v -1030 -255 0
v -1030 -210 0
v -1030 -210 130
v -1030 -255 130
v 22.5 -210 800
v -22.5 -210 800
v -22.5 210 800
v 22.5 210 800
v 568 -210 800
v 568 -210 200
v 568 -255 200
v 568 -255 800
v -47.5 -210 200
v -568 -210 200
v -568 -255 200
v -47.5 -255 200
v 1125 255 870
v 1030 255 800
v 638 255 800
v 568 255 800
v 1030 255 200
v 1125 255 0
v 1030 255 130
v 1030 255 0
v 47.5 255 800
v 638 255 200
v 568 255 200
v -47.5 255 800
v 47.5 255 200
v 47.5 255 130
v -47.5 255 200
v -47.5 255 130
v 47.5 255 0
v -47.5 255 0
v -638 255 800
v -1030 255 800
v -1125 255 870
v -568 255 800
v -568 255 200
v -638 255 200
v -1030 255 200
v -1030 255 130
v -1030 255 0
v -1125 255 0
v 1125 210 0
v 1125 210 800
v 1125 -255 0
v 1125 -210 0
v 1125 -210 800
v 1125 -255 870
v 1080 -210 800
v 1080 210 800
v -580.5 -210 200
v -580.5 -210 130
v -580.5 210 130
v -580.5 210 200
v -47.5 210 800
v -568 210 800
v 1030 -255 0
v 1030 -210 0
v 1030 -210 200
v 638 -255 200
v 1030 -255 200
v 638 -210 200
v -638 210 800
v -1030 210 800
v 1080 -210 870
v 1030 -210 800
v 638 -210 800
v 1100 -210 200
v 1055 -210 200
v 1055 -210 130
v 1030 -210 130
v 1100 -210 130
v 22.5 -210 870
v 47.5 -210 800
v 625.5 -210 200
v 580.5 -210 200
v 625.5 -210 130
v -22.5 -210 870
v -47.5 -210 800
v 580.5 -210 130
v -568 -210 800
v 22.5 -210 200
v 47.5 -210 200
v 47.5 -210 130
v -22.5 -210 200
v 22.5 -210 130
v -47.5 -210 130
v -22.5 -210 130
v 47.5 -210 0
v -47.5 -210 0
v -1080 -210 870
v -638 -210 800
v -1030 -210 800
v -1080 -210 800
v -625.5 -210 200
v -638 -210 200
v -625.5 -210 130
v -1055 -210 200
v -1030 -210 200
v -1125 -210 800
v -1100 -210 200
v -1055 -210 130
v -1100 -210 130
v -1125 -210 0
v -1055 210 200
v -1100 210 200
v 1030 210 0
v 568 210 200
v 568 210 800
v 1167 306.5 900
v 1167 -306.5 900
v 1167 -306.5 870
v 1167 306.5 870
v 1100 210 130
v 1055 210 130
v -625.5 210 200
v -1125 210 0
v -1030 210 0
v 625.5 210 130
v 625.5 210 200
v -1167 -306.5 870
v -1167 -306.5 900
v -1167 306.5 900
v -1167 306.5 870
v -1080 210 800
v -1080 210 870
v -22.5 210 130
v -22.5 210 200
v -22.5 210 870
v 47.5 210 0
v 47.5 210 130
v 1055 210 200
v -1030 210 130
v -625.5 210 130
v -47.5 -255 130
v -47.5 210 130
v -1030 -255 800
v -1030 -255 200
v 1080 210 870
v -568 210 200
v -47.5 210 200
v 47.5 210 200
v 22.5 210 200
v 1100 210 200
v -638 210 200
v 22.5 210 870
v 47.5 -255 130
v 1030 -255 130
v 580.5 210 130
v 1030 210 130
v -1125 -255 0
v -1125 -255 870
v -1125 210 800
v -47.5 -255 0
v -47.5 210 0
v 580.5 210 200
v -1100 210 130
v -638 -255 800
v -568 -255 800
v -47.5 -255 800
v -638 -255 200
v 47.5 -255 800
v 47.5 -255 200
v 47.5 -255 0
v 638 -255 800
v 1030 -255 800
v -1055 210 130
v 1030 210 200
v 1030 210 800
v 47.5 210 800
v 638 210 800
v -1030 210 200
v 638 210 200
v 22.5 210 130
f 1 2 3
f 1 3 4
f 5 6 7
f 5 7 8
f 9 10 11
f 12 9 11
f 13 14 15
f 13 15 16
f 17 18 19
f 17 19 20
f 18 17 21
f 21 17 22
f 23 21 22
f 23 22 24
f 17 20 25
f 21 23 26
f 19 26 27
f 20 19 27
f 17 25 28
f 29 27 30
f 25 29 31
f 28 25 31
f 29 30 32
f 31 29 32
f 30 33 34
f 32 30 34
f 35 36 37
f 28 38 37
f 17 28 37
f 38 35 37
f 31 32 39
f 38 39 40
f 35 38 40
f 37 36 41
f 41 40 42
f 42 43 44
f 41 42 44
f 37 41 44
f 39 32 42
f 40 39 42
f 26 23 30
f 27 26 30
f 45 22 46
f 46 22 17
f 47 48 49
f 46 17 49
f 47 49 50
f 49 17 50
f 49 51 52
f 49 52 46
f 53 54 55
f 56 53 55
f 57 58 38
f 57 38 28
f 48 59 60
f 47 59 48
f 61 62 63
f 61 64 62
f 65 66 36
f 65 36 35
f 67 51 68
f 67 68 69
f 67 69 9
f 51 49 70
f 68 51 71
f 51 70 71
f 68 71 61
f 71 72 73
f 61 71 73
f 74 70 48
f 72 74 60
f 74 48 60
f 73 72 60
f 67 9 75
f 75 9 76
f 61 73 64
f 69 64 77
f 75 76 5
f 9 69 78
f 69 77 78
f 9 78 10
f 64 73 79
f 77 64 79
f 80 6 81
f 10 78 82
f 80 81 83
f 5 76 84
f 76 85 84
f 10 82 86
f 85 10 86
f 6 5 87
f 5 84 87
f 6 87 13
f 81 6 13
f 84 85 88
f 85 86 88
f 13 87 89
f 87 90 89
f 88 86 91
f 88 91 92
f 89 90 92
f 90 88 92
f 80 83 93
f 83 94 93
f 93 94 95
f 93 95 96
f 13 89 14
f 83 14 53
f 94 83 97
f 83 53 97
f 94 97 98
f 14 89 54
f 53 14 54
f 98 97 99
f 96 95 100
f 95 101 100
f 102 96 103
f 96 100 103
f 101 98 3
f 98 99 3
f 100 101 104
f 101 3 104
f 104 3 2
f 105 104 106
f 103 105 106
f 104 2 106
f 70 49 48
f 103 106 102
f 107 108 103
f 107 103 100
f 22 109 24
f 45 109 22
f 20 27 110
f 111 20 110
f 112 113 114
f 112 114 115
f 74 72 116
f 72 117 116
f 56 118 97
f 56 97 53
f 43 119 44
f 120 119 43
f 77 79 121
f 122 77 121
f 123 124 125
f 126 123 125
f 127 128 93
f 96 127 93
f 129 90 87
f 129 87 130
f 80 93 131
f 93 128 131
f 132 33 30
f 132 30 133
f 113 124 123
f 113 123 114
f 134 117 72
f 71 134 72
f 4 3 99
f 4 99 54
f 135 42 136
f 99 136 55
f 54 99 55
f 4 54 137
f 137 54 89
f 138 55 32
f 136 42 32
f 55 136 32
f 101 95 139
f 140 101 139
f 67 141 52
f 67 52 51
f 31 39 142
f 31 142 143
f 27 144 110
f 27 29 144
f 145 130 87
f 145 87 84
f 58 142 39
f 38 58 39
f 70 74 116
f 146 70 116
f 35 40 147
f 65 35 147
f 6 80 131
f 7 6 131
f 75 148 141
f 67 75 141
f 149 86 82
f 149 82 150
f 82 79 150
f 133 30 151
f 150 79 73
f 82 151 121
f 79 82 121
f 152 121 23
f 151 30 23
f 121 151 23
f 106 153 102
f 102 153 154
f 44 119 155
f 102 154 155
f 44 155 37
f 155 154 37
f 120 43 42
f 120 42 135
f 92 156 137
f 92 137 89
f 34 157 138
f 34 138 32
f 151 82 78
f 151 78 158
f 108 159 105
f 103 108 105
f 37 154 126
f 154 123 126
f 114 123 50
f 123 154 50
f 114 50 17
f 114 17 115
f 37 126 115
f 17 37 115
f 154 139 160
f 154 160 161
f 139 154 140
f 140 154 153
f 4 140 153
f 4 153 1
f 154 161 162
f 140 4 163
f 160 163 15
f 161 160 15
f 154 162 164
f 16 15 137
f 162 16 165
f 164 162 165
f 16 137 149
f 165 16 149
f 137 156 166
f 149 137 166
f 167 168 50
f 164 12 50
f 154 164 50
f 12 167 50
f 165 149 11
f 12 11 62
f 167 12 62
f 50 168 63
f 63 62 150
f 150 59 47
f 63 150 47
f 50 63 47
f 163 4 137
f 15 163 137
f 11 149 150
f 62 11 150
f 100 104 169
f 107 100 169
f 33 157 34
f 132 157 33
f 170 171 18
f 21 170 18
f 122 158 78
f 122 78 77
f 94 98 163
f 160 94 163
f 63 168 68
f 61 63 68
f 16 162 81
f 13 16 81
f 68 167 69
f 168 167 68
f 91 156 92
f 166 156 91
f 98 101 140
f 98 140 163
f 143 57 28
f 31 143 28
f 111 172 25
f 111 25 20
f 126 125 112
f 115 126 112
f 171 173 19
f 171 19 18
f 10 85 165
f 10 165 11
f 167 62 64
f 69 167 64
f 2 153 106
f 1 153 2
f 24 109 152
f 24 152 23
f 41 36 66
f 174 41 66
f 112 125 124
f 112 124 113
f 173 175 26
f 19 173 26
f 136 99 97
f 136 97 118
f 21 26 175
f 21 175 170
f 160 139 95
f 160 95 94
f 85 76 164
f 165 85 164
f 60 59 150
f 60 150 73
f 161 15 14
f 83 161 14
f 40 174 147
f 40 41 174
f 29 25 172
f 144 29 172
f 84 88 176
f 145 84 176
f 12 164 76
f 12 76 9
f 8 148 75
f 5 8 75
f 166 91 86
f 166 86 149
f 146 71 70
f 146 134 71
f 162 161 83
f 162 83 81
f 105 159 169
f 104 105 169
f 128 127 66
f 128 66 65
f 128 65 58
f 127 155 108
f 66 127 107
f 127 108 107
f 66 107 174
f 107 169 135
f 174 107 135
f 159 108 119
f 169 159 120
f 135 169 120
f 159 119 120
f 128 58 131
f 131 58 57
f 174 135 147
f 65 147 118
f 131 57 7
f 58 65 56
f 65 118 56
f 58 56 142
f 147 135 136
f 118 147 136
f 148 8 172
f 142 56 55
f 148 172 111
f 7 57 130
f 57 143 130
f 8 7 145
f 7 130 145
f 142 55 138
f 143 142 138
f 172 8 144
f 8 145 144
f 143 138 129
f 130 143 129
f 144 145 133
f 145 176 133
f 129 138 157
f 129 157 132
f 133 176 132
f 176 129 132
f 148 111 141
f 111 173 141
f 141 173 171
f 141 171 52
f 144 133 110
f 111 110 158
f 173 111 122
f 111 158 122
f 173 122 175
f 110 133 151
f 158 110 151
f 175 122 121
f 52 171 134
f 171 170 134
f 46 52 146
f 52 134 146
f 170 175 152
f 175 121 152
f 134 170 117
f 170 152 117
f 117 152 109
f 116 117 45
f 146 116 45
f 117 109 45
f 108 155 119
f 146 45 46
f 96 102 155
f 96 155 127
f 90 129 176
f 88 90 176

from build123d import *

# Parameters (mm, degrees)
F1_W      = 2334
F1_H      = 613
F2_DEPTH  = 30
F3_W      = 45
F3_H      = 420
F3_W_2    = 982.5
F3_H_2    = 45
F4_DEPTH  = 70
F5_DEPTH  = 870
F8_W      = 45
F8_H      = 420
F9_DEPTH  = 70
F10_DEPTH = 670
F11_DEPTH = 70


# Not quite as in the source:
# - a feature names something its author has since deleted; it is built from what else it names


with BuildPart() as f2:
    # F1 (on offset) → F2 (new body)
    with BuildSketch(Plane.XY.offset(900)):
        Rectangle(F1_W, F1_H)
    extrude(amount=-F2_DEPTH)

    # F3 (on face) → F4 (join)
    with BuildSketch(Plane(origin=(0, 0, 870), x_dir=(1, 0, 0), z_dir=(0, 0, -1))):
        with Locations((-1102.5, 0)):
            Rectangle(F3_W, F3_H)
        with Locations((1102.5, 0)):
            Rectangle(F3_W, F3_H)
        with Locations((-538.75, 232.5)):
            Rectangle(F3_W_2, F3_H_2)
        with Locations((-538.75, -232.5)):
            Rectangle(F3_W_2, F3_H_2)
        Polygon((47.5, 255), (-47.5, 255), (-47.5, 210), (-22.5, 210), (22.5, 210), (47.5, 210), align=None)
        with Locations((538.75, 232.5)):
            Rectangle(F3_W_2, F3_H_2)
        Polygon((22.5, 210), (-22.5, 210), (-22.5, -210), (22.5, -210), (22.5, -47.5), (22.5, 47.5), align=None)
        with Locations((538.75, -232.5)):
            Rectangle(F3_W_2, F3_H_2)
    extrude(amount=F4_DEPTH)

    # F3 (on face) → F5 (join)
    with BuildSketch(Plane(origin=(0, 0, 870), x_dir=(1, 0, 0), z_dir=(0, 0, -1))):
        Polygon((-1030, 255), (-1125, 255), (-1125, 210), (-1080, 210), (-1030, 210), align=None)
        Polygon((47.5, 255), (-47.5, 255), (-47.5, 210), (-22.5, 210), (22.5, 210), (47.5, 210), align=None)
        Polygon((-1080, -210), (-1125, -210), (-1125, -255), (-1030, -255), (-1030, -210), align=None)
        Polygon((1125, 255), (1030, 255), (1030, 210), (1080, 210), (1125, 210), align=None)
        Polygon((22.5, -210), (-22.5, -210), (-47.5, -210), (-47.5, -255), (47.5, -255), (47.5, -210), align=None)
        Polygon((1125, -255), (1125, -210), (1080, -210), (1030, -210), (1030, -255), align=None)
    extrude(amount=F5_DEPTH)

    # F8 (on offset) → F9 (join)
    with BuildSketch(Plane.XY.offset(130)):
        Polygon((-638, 210), (-638, 255), (-1100, 255), (-1100, -255), (-638, -255), (-638, -210), (-1055, -210), (-1055, 210), align=None)
        Polygon((568, 210), (568, 255), (-568, 255), (-568, 210), (-22.5, 210), (22.5, 210), align=None)
        Polygon((-568, -255), (568, -255), (568, -210), (22.5, -210), (-22.5, -210), (-568, -210), align=None)
        Rectangle(F8_W, F8_H)
        Polygon((1100, -255), (1100, 255), (638, 255), (638, 210), (1055, 210), (1055, -210), (638, -210), (638, -255), align=None)
    extrude(amount=F9_DEPTH)

    # F8 (on offset) → F10 (join, through all)
    with BuildSketch(Plane.XY.offset(130)):
        Polygon((-638, -255), (-568, -255), (-568, -210), (-580.5, -210), (-625.5, -210), (-638, -210), align=None)
        Polygon((-568, 210), (-568, 255), (-638, 255), (-638, 210), (-625.5, 210), (-580.5, 210), align=None)
        Polygon((638, 210), (638, 255), (568, 255), (568, 210), (580.5, 210), (625.5, 210), align=None)
        Polygon((568, -255), (638, -255), (638, -210), (625.5, -210), (580.5, -210), (568, -210), align=None)
    extrude(amount=F10_DEPTH)

    # F8 (on offset) → F11 (join)
    with BuildSketch(Plane.XY.offset(130)):
        with Locations((-603, 0)):
            Rectangle(F8_W, F8_H)
        with Locations((603, 0)):
            Rectangle(F8_W, F8_H)
    extrude(amount=F11_DEPTH)


solid = f2.part
